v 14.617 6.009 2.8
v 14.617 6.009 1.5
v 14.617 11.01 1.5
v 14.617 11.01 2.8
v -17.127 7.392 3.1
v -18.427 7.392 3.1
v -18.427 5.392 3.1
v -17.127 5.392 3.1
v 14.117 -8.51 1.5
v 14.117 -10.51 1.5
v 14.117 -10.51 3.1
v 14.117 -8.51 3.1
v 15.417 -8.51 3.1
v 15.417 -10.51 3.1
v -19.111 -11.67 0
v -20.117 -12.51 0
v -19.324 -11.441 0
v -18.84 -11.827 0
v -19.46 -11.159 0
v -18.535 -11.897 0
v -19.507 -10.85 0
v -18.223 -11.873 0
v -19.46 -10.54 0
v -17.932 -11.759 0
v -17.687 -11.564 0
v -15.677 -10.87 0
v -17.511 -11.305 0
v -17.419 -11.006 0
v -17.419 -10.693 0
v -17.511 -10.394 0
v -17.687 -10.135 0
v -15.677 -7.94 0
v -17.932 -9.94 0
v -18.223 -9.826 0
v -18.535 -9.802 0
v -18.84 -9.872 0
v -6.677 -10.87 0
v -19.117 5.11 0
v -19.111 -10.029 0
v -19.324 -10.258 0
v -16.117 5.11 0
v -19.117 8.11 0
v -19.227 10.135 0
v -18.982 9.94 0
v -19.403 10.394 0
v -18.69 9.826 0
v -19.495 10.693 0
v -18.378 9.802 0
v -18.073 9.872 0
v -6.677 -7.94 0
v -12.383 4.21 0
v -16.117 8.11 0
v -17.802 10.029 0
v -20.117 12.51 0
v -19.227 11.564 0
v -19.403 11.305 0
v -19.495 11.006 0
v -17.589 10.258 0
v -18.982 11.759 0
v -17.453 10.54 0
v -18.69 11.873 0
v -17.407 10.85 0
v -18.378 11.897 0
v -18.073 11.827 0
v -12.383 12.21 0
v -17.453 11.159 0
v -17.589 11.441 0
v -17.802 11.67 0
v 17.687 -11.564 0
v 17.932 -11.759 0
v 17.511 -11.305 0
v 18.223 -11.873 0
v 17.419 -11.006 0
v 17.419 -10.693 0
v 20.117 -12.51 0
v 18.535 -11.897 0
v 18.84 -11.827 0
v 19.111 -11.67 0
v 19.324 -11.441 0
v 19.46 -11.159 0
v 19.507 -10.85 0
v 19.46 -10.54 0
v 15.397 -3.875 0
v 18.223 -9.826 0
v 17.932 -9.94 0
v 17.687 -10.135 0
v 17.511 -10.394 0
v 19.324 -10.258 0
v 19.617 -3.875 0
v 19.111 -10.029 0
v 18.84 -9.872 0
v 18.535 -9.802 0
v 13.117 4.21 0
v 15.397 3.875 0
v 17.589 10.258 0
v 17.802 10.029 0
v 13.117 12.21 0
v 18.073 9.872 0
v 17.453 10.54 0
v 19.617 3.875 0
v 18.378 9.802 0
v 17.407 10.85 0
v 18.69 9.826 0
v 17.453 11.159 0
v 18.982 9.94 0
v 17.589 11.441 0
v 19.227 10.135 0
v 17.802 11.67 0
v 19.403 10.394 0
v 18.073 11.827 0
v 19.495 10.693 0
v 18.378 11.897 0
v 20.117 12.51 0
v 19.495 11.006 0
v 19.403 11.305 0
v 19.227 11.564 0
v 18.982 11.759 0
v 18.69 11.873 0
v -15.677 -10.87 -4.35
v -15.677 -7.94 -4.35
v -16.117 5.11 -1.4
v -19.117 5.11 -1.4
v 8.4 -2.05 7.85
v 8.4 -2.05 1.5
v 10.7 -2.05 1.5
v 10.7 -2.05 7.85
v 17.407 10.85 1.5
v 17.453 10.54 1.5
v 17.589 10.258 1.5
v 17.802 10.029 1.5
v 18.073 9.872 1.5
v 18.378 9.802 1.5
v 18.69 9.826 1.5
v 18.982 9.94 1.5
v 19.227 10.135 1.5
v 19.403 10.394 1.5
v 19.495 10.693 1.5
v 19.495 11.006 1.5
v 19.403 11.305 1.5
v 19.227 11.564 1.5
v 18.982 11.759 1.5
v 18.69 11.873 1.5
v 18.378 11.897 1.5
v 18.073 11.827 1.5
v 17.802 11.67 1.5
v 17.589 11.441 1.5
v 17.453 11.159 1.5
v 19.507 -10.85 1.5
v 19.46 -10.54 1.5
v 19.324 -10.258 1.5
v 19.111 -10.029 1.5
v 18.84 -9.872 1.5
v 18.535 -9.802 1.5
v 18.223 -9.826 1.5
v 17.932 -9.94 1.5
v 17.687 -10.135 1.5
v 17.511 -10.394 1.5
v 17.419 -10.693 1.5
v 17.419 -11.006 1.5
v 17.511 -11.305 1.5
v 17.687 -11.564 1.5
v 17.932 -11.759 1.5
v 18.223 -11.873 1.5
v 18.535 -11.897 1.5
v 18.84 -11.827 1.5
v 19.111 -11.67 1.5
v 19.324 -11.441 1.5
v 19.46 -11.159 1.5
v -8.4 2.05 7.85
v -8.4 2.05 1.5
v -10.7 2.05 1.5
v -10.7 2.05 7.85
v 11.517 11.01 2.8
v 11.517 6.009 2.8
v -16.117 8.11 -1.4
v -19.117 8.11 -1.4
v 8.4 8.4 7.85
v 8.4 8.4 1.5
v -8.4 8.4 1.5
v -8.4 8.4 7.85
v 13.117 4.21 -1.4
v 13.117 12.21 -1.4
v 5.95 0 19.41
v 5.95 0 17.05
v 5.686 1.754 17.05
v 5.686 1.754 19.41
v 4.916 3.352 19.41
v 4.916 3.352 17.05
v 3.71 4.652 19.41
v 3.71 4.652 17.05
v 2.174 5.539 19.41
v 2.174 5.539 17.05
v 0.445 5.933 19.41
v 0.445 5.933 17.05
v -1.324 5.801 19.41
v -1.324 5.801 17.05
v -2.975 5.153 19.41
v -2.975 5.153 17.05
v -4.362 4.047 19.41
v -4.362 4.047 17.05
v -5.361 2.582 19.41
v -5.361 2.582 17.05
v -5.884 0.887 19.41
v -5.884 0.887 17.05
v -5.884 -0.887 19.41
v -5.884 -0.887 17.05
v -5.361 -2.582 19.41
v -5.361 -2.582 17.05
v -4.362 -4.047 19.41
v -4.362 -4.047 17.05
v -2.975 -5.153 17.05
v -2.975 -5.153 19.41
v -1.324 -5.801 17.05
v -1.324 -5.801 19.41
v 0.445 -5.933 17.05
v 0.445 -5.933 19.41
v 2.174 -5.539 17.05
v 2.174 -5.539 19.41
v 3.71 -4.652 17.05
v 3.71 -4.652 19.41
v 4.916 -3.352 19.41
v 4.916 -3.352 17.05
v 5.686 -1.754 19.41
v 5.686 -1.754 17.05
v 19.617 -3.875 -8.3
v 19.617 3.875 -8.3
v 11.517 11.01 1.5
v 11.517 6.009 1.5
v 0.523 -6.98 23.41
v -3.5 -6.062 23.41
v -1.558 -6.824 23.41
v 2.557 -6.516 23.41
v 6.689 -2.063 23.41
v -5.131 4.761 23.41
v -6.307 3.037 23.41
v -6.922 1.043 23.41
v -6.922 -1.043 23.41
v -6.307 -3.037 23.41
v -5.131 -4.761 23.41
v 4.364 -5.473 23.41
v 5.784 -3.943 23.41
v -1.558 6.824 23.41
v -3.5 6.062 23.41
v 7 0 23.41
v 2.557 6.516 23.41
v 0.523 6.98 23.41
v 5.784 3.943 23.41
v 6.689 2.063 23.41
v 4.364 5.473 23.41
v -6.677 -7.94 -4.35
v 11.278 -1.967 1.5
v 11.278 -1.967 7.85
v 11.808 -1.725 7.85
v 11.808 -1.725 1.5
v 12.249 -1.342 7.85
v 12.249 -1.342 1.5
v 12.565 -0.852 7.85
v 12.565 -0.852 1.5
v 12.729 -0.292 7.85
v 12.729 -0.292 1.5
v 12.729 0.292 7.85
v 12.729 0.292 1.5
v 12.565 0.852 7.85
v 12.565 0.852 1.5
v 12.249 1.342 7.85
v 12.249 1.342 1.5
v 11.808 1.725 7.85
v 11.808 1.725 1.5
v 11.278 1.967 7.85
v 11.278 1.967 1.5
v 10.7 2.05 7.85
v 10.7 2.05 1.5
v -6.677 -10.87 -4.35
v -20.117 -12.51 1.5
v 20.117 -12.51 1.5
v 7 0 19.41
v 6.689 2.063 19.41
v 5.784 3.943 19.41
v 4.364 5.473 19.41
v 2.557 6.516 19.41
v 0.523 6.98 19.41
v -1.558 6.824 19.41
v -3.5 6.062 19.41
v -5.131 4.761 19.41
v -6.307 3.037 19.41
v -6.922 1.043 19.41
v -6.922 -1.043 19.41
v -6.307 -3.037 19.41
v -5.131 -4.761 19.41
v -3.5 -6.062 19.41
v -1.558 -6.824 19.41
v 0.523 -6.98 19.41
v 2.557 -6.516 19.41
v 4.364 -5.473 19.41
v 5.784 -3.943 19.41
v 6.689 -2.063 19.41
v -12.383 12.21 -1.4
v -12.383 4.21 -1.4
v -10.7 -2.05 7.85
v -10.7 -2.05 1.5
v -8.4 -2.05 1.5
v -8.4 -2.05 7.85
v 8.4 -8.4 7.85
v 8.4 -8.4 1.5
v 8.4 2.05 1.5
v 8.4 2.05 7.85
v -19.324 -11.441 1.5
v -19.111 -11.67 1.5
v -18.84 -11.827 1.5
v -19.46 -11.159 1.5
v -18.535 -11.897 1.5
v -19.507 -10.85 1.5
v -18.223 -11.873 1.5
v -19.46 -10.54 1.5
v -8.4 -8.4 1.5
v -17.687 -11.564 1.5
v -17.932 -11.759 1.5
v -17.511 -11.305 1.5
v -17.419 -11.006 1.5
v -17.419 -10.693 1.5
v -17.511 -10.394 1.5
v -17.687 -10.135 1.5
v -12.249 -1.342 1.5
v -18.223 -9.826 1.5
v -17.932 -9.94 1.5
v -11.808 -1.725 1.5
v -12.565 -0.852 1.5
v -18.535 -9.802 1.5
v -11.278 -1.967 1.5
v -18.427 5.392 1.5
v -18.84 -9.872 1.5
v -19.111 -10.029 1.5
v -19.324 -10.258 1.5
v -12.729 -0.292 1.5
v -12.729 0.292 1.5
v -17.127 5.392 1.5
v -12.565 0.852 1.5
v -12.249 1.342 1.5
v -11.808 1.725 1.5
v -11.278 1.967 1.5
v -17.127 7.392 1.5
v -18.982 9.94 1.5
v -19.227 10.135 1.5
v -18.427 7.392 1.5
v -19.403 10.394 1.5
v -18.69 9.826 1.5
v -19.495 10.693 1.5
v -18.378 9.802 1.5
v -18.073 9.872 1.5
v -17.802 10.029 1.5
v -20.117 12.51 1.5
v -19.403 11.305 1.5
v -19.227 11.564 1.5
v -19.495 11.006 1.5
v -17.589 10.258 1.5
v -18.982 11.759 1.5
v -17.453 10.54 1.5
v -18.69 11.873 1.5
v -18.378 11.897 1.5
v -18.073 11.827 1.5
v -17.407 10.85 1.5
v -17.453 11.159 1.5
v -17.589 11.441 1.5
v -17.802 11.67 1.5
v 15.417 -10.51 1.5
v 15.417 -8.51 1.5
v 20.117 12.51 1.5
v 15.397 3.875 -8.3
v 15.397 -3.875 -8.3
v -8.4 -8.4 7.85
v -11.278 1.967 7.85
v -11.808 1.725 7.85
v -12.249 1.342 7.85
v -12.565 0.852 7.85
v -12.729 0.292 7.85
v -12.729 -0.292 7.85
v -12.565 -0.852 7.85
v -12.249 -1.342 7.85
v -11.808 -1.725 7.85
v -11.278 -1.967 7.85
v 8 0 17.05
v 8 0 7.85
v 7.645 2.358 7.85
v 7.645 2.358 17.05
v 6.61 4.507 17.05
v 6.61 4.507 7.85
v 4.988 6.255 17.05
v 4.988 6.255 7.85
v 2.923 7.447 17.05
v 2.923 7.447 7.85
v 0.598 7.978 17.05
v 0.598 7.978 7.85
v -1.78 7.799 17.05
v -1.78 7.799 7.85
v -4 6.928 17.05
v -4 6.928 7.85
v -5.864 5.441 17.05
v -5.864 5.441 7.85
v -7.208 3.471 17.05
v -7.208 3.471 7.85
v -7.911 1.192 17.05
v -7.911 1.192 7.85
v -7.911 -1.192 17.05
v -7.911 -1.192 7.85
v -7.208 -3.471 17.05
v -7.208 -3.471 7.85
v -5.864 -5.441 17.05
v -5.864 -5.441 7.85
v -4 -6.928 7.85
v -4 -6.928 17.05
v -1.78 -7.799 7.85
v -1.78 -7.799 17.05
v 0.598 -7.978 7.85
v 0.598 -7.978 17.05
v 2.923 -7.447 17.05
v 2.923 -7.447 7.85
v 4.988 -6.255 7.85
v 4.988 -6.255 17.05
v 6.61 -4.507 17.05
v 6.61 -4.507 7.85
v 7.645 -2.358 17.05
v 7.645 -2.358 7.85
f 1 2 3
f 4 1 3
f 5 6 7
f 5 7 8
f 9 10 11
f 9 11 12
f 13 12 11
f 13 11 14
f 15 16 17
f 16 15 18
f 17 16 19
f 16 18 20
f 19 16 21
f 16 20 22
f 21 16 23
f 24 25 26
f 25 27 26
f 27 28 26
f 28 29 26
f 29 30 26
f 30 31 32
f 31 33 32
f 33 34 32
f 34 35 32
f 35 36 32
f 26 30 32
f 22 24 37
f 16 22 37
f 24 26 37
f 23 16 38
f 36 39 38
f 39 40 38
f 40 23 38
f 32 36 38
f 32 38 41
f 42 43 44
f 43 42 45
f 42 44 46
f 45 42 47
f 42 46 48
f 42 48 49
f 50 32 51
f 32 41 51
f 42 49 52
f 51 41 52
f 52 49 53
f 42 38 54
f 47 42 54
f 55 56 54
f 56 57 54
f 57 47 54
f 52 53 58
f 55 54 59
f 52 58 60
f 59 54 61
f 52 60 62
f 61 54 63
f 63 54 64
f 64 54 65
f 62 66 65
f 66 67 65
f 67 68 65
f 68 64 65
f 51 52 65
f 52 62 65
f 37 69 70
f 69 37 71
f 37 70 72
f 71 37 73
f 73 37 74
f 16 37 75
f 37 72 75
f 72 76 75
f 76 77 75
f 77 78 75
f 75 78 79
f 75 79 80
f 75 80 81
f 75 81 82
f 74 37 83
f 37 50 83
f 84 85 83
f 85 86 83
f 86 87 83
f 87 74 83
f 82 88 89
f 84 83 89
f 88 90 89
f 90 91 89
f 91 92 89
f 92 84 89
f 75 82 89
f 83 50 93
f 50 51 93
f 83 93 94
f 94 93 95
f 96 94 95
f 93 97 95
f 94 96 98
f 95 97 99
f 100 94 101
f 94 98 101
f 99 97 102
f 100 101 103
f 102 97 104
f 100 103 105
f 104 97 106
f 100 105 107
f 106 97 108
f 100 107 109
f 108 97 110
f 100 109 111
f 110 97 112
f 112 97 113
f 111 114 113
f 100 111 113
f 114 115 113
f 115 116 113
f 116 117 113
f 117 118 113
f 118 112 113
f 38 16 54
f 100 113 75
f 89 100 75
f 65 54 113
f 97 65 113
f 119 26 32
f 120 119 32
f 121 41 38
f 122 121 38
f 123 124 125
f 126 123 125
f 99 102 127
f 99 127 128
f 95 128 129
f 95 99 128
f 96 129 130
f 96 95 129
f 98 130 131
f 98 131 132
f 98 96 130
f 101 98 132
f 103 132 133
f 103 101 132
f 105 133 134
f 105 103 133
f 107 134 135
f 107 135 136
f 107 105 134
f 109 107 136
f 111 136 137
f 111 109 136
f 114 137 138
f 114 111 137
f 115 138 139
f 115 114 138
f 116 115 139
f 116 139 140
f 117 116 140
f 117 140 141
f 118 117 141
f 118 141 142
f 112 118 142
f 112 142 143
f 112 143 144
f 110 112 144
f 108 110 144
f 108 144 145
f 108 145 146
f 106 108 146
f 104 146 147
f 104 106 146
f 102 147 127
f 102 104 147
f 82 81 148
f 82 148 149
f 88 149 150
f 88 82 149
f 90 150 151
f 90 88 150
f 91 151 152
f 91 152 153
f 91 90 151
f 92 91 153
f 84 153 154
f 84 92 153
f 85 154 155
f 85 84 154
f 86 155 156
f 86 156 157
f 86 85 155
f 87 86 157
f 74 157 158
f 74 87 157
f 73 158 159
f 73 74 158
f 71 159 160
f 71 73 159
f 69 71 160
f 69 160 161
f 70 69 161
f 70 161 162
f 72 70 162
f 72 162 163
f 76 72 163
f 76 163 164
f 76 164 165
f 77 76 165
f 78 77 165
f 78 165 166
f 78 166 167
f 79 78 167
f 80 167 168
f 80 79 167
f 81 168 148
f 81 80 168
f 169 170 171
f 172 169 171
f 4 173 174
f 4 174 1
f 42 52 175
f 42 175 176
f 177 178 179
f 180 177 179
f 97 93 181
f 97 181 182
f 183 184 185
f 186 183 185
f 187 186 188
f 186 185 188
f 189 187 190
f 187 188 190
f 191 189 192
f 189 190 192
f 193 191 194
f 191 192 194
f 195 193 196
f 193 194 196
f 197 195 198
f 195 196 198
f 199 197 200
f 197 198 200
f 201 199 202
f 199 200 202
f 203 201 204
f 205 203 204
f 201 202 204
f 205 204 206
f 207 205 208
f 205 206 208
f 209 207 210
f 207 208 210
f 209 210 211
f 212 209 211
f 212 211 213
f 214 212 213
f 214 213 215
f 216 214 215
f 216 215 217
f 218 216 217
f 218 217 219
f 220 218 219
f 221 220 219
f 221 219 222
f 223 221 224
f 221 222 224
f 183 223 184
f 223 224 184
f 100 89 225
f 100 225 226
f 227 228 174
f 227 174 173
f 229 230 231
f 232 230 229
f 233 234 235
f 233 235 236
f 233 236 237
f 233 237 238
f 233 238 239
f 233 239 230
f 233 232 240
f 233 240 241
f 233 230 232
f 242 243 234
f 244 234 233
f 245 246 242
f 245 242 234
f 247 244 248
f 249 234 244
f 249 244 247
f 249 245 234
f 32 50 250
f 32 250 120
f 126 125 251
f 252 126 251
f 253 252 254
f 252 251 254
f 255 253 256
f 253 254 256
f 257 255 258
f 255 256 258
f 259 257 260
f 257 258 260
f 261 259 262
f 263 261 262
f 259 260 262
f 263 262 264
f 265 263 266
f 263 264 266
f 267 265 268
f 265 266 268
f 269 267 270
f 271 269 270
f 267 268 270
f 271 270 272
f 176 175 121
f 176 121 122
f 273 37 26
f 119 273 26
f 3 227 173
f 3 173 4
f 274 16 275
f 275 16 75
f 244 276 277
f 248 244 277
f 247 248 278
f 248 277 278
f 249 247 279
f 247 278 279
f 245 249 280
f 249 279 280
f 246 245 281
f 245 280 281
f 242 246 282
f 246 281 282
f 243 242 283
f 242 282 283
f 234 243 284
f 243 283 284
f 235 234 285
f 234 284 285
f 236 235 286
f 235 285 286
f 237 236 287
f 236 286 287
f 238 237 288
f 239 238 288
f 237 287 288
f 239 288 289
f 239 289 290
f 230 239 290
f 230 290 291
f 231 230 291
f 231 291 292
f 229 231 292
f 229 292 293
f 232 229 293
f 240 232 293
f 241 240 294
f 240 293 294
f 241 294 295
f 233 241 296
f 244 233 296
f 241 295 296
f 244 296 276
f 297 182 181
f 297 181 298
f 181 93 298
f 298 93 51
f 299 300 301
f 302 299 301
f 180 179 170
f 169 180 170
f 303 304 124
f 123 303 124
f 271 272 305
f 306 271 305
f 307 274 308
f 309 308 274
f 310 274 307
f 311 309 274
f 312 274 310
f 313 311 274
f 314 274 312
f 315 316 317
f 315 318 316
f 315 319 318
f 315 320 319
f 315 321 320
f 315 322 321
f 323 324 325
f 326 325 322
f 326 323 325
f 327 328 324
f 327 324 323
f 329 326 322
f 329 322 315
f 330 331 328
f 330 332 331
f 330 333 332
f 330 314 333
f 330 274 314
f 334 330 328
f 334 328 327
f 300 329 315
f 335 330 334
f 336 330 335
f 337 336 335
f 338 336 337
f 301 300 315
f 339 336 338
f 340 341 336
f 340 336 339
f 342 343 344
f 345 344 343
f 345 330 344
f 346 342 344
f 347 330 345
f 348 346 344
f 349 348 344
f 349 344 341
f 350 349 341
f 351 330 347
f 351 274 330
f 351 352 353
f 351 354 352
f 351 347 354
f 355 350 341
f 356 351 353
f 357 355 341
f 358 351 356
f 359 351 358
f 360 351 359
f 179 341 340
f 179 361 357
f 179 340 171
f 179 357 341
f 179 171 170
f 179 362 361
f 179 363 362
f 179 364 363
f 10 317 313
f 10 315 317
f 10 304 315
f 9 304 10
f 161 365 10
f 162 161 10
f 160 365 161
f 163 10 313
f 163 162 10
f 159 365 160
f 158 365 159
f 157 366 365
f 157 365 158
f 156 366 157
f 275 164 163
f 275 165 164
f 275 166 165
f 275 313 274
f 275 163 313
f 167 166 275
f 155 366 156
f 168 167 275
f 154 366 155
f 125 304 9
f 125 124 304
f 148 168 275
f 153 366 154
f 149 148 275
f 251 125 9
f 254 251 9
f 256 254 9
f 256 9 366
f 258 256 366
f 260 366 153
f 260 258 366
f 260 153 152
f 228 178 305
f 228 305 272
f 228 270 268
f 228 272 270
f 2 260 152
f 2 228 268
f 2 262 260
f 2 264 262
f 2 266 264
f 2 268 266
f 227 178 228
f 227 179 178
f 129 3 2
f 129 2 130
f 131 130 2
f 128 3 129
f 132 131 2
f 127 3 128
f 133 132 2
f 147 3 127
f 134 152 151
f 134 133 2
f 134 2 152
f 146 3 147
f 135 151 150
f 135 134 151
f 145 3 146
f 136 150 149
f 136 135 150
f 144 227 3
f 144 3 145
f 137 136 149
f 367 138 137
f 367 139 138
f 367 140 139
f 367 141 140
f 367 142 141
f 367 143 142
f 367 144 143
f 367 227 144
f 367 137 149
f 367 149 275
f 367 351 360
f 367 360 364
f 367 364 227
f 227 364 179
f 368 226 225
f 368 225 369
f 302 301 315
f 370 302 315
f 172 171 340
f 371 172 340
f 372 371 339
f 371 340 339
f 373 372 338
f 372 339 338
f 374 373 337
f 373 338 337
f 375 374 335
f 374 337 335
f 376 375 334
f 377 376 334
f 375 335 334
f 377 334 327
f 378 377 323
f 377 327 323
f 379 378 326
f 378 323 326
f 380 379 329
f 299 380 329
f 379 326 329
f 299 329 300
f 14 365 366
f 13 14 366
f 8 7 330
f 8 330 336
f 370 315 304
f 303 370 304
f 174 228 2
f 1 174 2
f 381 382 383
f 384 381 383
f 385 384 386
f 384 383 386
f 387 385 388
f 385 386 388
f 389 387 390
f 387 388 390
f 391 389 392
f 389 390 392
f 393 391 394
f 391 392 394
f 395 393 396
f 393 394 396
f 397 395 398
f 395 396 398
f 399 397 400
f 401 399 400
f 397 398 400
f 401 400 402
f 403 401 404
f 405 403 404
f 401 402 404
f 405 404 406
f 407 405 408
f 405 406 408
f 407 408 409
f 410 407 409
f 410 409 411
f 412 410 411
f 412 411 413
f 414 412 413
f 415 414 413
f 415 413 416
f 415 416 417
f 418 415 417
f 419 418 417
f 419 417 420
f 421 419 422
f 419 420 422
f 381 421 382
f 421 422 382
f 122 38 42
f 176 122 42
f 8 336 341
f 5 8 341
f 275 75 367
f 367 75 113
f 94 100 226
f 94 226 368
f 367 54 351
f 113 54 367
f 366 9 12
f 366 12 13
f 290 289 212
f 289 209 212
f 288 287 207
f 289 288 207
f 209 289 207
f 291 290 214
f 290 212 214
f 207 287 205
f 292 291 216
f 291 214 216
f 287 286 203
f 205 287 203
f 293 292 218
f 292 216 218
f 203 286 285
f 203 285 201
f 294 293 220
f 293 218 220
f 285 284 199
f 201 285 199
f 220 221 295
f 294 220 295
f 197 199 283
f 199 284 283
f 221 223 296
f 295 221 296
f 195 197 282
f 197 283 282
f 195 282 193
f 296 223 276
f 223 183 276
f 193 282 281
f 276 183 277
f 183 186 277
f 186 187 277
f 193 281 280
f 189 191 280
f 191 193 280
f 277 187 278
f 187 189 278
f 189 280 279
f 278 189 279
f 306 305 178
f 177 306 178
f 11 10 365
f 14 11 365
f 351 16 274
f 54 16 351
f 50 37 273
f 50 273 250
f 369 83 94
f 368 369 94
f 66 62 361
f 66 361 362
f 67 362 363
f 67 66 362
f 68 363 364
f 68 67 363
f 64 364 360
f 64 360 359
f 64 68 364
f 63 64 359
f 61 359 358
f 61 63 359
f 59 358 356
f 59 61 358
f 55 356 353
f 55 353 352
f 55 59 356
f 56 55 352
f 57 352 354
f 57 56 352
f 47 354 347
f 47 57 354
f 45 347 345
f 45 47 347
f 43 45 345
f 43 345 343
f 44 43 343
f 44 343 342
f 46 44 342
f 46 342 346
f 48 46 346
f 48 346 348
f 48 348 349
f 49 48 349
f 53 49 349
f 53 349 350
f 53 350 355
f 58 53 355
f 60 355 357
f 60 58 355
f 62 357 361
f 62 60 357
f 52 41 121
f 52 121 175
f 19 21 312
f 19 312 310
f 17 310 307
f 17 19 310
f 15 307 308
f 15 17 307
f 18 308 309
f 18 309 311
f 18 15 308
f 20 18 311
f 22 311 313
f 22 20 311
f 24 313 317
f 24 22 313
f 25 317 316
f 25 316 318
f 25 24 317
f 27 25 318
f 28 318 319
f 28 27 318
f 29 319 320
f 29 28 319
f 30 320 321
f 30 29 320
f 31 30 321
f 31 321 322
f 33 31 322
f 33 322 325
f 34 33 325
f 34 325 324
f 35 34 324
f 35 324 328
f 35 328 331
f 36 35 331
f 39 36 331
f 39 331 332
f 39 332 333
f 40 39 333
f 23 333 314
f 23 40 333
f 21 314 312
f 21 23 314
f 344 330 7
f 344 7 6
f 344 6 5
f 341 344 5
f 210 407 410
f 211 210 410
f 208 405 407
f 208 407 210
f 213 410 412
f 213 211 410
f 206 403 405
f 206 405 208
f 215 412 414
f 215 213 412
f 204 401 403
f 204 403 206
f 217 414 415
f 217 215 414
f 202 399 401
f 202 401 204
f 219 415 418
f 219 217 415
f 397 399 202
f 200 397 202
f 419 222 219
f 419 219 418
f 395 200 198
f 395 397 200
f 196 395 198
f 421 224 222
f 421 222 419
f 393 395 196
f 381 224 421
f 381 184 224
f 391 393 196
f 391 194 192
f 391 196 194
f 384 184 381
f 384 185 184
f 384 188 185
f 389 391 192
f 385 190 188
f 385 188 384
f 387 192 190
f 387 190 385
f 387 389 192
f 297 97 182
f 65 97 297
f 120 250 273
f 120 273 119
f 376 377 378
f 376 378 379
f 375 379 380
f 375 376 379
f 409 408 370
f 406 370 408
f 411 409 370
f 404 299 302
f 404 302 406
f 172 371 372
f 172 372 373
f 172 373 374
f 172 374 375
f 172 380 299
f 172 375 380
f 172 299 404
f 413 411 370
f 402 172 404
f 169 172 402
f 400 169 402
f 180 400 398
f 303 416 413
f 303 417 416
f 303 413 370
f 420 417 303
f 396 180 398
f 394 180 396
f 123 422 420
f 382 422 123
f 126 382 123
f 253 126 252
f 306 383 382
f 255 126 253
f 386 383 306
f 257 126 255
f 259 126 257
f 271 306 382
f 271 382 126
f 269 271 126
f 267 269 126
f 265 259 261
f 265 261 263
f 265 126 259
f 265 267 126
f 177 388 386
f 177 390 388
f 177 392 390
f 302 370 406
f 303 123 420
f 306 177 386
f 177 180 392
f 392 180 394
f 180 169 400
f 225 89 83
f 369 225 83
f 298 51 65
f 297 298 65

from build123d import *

# Parameters (mm, degrees)
SKETCH2_W            = 40.2336
SKETCH2_H            = 25.019
SKETCH2_R            = 1.05
BOSS_EXTRUDE1_DEPTH  = 1.5
BOSS_EXTRUDE2_DEPTH  = 6.35
SKETCH4_R            = 8
BOSS_EXTRUDE3_DEPTH  = 9.2
SKETCH5_R            = 5.95
BOSS_EXTRUDE4_DEPTH  = 2.36
SKETCH6_R            = 7
BOSS_EXTRUDE5_DEPTH  = 4
SKETCH7_W            = 4.22
SKETCH7_H            = 7.75
BOSS_EXTRUDE6_DEPTH  = 8.3
SKETCH8_W            = 9
SKETCH8_H            = 2.93
BOSS_EXTRUDE7_DEPTH  = 4.35
SKETCH9_W            = 3.1
SKETCH9_H            = 5
BOSS_EXTRUDE8_DEPTH  = 1.3
SKETCH10_W           = 25.5
SKETCH10_H           = 8
BOSS_EXTRUDE9_DEPTH  = 1.4
SKETCH11_W           = 1.3
SKETCH11_H           = 2
BOSS_EXTRUDE10_DEPTH = 1.6
SKETCH12_W           = 3
SKETCH12_H           = 3
BOSS_EXTRUDE11_DEPTH = 1.4


with BuildPart() as part:
    # Sketch2 → Boss-Extrude1 (new body)
    with BuildSketch(Plane.XY):
        Rectangle(SKETCH2_W, SKETCH2_H)
        with Locations((-18.4568, 10.8495)):
            Circle(SKETCH2_R, mode=Mode.SUBTRACT)
        with Locations(Location((-18.4568, -10.8495, 0), (0, 0, 180))):
            Circle(SKETCH2_R, mode=Mode.SUBTRACT)
        with Locations((18.4568, -10.8495)):
            Circle(SKETCH2_R, mode=Mode.SUBTRACT)
        with Locations(Location((18.4568, 10.8495, 0), (0, 0, 180))):
            Circle(SKETCH2_R, mode=Mode.SUBTRACT)
    extrude(amount=BOSS_EXTRUDE1_DEPTH)

    # Sketch3 → Boss-Extrude2 (add)
    with BuildSketch(Plane.XY.offset(1.5)):
        with BuildLine():
            Line((-8.4, -2.05), (-8.4, -8.4))
            Line((-8.4, -8.4), (8.4, -8.4))
            Line((8.4, -8.4), (8.4, -2.05))
            Line((8.4, -2.05), (10.7, -2.05))
            ThreePointArc((10.7, -2.05), (12.75, 0), (10.7, 2.05))
            Line((10.7, 2.05), (8.4, 2.05))
            Line((8.4, 2.05), (8.4, 8.4))
            Line((8.4, 8.4), (-8.4, 8.4))
            Line((-8.4, 8.4), (-8.4, 2.05))
            Line((-8.4, 2.05), (-10.7, 2.05))
            ThreePointArc((-10.7, 2.05), (-12.75, 0), (-10.7, -2.05))
            Line((-10.7, -2.05), (-8.4, -2.05))
        make_face()
    extrude(amount=BOSS_EXTRUDE2_DEPTH)

    # Sketch4 → Boss-Extrude3 (add)
    with BuildSketch(Plane.XY.offset(7.85)):
        Circle(SKETCH4_R)
    extrude(amount=BOSS_EXTRUDE3_DEPTH)

    # Sketch5 → Boss-Extrude4 (add)
    with BuildSketch(Plane.XY.offset(17.05)):
        Circle(SKETCH5_R)
    extrude(amount=BOSS_EXTRUDE4_DEPTH)

    # Sketch6 → Boss-Extrude5 (add)
    with BuildSketch(Plane.XY.offset(19.41)):
        Circle(SKETCH6_R)
    extrude(amount=BOSS_EXTRUDE5_DEPTH)

    # Sketch7 → Boss-Extrude6 (add)
    with BuildSketch(Plane(origin=(0, 0, 0), x_dir=(-1, 0, 0), z_dir=(0, 0, -1))):
        with Locations((-17.5068, 0)):
            Rectangle(SKETCH7_W, SKETCH7_H)
    extrude(amount=BOSS_EXTRUDE6_DEPTH)

    # Sketch8 → Boss-Extrude7 (add)
    with BuildSketch(Plane(origin=(0, 0, 0), x_dir=(-1, 0, 0), z_dir=(0, 0, -1))):
        with Locations((11.1768, -9.4045)):
            Rectangle(SKETCH8_W, SKETCH8_H)
    extrude(amount=BOSS_EXTRUDE7_DEPTH)

    # Sketch9 → Boss-Extrude8 (add)
    with BuildSketch(Plane.XY.offset(1.5)):
        with Locations((13.0668, 8.5095)):
            Rectangle(SKETCH9_W, SKETCH9_H)
    extrude(amount=BOSS_EXTRUDE8_DEPTH)

    # Sketch10 → Boss-Extrude9 (add)
    with BuildSketch(Plane(origin=(0, 0, 0), x_dir=(-1, 0, 0), z_dir=(0, 0, -1))):
        with Locations((-0.3668, 8.2095)):
            Rectangle(SKETCH10_W, SKETCH10_H)
    extrude(amount=BOSS_EXTRUDE9_DEPTH)

    # Sketch11 → Boss-Extrude10 (add)
    with BuildSketch(Plane.XY.offset(1.5)):
        with Locations((14.7668, -9.5095)):
            Rectangle(SKETCH11_W, SKETCH11_H)
        with Locations((-17.777092667, 6.391636208)):
            Rectangle(SKETCH11_W, SKETCH11_H)
    extrude(amount=BOSS_EXTRUDE10_DEPTH)

    # Sketch12 → Boss-Extrude11 (add)
    with BuildSketch(Plane(origin=(0, 0, 0), x_dir=(-1, 0, 0), z_dir=(0, 0, -1))):
        with Locations((17.6168, 6.6095)):
            Rectangle(SKETCH12_W, SKETCH12_H)
    extrude(amount=BOSS_EXTRUDE11_DEPTH)


solid = part.part
